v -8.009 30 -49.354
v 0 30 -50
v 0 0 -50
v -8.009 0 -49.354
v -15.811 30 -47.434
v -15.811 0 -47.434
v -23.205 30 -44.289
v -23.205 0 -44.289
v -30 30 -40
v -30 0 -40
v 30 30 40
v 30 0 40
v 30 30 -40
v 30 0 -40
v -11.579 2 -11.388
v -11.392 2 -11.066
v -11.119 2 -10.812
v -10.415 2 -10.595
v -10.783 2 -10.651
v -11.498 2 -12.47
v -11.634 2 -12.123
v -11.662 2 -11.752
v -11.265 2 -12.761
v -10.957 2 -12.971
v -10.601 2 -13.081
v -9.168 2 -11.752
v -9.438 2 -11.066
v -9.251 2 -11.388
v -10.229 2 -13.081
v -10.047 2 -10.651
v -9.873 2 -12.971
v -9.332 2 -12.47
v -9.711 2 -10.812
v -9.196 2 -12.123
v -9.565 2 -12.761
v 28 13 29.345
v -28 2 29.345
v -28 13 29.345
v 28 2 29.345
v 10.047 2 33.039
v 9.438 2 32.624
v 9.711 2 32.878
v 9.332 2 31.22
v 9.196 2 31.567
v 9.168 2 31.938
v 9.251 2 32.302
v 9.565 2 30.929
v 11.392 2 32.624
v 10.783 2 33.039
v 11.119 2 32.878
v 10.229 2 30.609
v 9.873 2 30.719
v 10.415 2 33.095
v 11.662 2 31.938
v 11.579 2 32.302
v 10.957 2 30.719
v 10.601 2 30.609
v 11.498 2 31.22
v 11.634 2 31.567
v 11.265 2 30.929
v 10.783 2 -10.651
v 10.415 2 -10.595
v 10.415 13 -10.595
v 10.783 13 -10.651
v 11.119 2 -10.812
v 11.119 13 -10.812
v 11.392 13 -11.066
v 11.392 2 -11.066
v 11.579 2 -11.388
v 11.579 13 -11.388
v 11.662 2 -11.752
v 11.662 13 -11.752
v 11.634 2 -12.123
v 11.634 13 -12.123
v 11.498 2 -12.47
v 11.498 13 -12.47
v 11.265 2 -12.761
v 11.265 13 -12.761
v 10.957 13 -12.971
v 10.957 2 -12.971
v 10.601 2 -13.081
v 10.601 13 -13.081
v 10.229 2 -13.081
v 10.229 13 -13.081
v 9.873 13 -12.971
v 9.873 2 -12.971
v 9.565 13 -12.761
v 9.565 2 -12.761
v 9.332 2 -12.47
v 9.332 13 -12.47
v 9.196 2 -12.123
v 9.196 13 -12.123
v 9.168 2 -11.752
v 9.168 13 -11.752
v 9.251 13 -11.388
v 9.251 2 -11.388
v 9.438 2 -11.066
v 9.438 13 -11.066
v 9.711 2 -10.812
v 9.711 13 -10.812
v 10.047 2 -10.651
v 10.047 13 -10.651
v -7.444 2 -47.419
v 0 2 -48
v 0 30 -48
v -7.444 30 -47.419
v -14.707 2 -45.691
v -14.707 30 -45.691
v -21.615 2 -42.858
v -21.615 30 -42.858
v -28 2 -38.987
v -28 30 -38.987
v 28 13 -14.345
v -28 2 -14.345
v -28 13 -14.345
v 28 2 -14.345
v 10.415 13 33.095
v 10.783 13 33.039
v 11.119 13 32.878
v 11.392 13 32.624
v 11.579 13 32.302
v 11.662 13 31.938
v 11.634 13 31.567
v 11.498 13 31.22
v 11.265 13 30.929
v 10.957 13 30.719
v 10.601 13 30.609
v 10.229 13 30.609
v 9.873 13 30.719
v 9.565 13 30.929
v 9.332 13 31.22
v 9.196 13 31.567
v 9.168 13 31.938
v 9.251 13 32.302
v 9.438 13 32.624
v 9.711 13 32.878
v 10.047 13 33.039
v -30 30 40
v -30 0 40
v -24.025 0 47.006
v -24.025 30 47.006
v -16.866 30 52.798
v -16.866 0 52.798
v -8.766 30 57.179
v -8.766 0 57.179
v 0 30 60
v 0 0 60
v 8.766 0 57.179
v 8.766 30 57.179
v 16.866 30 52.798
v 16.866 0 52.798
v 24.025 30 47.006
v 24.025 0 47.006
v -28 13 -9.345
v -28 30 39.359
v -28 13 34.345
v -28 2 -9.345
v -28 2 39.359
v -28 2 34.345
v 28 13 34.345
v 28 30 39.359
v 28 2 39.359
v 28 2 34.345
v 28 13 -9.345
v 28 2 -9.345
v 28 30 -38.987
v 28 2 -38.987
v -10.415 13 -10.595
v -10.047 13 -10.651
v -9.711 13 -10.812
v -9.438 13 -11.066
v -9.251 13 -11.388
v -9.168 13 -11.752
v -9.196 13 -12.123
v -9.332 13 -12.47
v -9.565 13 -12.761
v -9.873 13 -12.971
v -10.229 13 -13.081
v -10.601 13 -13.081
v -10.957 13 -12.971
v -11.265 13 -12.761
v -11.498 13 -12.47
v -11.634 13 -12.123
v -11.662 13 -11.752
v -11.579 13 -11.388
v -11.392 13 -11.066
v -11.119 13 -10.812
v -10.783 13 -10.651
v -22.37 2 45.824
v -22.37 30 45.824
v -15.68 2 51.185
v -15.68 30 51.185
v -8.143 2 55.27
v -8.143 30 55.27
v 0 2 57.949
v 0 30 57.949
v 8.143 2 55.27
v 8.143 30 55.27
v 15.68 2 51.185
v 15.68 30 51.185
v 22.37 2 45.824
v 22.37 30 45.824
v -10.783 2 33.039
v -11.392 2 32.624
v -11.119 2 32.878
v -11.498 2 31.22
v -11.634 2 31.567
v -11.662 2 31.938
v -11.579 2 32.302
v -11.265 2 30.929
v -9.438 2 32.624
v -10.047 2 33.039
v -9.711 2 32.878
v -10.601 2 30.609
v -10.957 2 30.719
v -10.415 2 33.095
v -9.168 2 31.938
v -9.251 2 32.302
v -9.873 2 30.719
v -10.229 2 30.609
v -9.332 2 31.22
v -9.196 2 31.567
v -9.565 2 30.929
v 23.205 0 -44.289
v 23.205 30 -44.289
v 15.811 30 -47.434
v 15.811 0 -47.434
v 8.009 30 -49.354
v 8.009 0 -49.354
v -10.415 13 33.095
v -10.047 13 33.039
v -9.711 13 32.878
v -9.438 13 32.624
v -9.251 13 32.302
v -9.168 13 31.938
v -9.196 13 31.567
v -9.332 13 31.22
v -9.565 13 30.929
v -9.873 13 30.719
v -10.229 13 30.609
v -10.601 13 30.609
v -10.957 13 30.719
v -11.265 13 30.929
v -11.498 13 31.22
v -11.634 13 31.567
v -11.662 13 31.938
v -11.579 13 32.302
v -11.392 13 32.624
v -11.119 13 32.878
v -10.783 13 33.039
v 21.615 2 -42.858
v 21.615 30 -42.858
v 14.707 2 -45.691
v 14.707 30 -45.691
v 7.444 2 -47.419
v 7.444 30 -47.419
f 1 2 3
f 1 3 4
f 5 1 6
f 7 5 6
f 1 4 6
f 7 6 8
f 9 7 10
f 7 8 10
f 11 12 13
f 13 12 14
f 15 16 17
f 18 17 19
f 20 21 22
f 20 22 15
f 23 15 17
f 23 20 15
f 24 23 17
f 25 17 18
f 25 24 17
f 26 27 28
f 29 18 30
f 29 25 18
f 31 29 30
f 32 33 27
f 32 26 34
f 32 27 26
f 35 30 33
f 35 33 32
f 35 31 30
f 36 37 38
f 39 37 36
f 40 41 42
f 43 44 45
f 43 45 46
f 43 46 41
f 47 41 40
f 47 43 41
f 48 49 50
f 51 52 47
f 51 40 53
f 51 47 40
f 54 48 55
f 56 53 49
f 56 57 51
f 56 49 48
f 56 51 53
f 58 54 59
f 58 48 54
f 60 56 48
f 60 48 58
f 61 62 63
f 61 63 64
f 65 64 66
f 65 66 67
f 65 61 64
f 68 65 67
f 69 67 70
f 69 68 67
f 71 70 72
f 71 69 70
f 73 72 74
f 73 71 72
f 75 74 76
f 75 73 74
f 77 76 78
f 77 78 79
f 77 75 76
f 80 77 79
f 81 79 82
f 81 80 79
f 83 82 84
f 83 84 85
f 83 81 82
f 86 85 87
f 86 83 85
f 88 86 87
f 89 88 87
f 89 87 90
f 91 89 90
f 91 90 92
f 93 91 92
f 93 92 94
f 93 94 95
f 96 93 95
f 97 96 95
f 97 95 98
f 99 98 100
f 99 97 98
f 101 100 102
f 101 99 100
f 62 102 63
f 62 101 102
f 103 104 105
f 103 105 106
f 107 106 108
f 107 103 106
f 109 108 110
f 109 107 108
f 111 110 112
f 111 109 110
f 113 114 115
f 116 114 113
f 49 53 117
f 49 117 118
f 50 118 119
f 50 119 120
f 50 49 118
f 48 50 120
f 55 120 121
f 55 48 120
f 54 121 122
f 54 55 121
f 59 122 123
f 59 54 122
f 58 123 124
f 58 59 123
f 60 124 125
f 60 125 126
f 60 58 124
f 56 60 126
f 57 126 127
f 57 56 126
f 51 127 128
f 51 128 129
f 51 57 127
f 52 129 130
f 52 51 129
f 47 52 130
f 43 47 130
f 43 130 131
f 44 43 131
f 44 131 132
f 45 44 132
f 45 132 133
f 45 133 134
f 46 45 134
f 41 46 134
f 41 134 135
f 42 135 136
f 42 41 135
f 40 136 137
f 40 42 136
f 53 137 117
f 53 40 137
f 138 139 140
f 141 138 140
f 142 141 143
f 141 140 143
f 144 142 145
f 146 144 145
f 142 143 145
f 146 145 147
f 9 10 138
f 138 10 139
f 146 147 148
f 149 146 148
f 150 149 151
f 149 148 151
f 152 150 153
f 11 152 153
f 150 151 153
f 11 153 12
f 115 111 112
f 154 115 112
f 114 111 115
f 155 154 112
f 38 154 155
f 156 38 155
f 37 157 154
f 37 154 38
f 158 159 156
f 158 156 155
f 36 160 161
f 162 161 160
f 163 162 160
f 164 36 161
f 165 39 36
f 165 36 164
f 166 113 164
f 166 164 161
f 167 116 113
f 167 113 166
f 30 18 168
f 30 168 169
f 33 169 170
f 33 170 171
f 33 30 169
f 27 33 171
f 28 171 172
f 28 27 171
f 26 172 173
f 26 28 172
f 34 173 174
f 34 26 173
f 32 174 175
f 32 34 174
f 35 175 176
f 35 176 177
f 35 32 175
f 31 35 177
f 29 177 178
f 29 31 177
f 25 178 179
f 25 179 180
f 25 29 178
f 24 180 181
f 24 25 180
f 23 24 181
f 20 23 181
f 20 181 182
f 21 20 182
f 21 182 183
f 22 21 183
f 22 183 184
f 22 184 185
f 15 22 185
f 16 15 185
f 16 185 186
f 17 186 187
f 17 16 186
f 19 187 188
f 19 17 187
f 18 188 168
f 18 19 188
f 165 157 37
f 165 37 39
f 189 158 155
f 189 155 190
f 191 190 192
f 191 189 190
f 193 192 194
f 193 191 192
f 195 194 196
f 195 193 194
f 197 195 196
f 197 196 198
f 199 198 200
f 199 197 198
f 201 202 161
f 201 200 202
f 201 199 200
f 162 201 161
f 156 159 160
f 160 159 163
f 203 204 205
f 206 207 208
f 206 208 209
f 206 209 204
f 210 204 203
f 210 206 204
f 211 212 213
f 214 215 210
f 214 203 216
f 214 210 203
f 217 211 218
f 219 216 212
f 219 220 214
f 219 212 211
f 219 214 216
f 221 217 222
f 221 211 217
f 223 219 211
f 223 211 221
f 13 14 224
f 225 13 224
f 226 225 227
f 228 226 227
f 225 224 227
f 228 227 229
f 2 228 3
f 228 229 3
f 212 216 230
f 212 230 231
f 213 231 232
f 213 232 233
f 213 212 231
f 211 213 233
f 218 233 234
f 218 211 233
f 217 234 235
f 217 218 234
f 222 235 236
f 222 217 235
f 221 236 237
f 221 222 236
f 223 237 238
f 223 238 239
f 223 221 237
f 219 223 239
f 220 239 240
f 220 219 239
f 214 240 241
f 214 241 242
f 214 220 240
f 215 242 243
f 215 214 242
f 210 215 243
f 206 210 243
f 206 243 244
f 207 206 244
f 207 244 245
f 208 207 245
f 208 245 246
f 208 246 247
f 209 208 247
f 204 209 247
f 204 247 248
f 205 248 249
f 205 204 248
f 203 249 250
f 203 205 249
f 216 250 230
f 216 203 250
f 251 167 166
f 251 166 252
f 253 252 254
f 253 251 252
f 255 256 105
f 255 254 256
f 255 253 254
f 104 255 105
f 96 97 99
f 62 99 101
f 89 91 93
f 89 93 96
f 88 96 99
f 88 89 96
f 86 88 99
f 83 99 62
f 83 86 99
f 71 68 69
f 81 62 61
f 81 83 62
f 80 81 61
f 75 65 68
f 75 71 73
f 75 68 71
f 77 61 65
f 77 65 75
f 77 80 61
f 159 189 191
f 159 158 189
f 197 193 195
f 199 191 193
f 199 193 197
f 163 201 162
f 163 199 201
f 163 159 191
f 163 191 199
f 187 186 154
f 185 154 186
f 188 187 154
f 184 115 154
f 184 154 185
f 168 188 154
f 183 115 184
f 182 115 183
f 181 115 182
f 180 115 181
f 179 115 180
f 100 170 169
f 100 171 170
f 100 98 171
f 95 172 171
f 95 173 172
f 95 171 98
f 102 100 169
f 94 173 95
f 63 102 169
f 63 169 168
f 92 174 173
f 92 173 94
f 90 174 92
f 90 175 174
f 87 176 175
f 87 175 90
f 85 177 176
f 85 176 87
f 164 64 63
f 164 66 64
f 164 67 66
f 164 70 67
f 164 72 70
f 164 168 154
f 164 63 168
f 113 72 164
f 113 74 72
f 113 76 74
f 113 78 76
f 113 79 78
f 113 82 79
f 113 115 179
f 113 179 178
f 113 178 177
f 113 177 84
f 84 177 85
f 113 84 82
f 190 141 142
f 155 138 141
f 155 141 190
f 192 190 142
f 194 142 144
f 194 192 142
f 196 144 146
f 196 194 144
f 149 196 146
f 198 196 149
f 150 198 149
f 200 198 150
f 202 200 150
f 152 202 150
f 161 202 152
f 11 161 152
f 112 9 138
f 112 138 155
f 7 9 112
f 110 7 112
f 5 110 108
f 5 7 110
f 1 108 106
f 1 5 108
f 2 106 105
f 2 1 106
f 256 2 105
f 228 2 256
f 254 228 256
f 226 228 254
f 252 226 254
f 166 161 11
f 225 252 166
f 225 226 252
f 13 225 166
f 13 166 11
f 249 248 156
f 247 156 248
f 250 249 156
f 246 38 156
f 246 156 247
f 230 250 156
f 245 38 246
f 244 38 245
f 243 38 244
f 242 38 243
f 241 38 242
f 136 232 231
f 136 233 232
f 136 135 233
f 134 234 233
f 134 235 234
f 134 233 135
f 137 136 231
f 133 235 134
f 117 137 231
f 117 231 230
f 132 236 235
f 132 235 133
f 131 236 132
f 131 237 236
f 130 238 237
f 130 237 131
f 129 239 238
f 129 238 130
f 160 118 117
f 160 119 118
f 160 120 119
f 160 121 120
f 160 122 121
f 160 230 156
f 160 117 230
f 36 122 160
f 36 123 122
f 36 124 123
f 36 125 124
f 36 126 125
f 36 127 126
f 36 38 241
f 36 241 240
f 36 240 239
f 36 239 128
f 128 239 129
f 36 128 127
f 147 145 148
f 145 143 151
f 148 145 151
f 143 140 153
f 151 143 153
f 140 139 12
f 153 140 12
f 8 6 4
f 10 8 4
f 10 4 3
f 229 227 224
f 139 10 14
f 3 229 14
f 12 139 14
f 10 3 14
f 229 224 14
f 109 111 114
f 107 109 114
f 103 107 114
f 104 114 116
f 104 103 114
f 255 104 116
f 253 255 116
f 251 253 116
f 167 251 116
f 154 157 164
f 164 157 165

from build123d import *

# Parameters (mm, degrees)
SALIENTE_EXTRUIR1_DEPTH = 30
VACIADO1_T              = -2
CROQUIS2_W              = 56
CROQUIS2_H              = 5
CROQUIS2_R              = 1.25
SALIENTE_EXTRUIR2_DEPTH = 11


with BuildPart() as part:
    # Croquis1 → Saliente-Extruir1 (new body)
    with BuildSketch(Plane(origin=(0, 0, 0), x_dir=(1, 0, 0), z_dir=(0, 1, 0))):
        with BuildLine():
            Line((-30, 40), (-30, -40))
            ThreePointArc((-30, -40), (-16.865514856, -52.798272284), (0, -60))
            ThreePointArc((0, -60), (16.865514856, -52.798272284), (30, -40))
            Line((30, -40), (30, 40))
            ThreePointArc((30, 40), (15.811388301, 47.434164903), (0, 50))
            ThreePointArc((0, 50), (-15.811388301, 47.434164903), (-30, 40))
        make_face()
    extrude(amount=SALIENTE_EXTRUIR1_DEPTH)

    # Vaciado1
    vaciado1_openings = [part.faces().sort_by_distance(p)[0] for p in [
        (0, 30, 3.068322719),
    ]]
    offset(amount=VACIADO1_T, openings=vaciado1_openings, kind=Kind.INTERSECTION)

    # Croquis2 → Saliente-Extruir2 (add)
    # profile 1 of 2: a face of its own
    with BuildSketch(Plane(origin=(0, 2, 0), x_dir=(1, 0, 0), z_dir=(0, 1, 0))):
        with Locations((0, -31.845)):
            Rectangle(CROQUIS2_W, CROQUIS2_H)
        with Locations(Location((-10.415, -31.845, 0), (0, 0, 270))):
            Circle(CROQUIS2_R, mode=Mode.SUBTRACT)
        with Locations(Location((10.415, -31.845, 0), (0, 0, 270))):
            Circle(CROQUIS2_R, mode=Mode.SUBTRACT)
    # profile 2 of 2: a face of its own
    with BuildSketch(Plane(origin=(0, 2, 0), x_dir=(1, 0, 0), z_dir=(0, 1, 0))):
        with Locations((0, 11.845)):
            Rectangle(CROQUIS2_W, CROQUIS2_H)
        with Locations(Location((-10.415, 11.845, 0), (0, 0, 270))):
            Circle(CROQUIS2_R, mode=Mode.SUBTRACT)
        with Locations(Location((10.415, 11.845, 0), (0, 0, 270))):
            Circle(CROQUIS2_R, mode=Mode.SUBTRACT)
    extrude(amount=SALIENTE_EXTRUIR2_DEPTH)


solid = part.part
